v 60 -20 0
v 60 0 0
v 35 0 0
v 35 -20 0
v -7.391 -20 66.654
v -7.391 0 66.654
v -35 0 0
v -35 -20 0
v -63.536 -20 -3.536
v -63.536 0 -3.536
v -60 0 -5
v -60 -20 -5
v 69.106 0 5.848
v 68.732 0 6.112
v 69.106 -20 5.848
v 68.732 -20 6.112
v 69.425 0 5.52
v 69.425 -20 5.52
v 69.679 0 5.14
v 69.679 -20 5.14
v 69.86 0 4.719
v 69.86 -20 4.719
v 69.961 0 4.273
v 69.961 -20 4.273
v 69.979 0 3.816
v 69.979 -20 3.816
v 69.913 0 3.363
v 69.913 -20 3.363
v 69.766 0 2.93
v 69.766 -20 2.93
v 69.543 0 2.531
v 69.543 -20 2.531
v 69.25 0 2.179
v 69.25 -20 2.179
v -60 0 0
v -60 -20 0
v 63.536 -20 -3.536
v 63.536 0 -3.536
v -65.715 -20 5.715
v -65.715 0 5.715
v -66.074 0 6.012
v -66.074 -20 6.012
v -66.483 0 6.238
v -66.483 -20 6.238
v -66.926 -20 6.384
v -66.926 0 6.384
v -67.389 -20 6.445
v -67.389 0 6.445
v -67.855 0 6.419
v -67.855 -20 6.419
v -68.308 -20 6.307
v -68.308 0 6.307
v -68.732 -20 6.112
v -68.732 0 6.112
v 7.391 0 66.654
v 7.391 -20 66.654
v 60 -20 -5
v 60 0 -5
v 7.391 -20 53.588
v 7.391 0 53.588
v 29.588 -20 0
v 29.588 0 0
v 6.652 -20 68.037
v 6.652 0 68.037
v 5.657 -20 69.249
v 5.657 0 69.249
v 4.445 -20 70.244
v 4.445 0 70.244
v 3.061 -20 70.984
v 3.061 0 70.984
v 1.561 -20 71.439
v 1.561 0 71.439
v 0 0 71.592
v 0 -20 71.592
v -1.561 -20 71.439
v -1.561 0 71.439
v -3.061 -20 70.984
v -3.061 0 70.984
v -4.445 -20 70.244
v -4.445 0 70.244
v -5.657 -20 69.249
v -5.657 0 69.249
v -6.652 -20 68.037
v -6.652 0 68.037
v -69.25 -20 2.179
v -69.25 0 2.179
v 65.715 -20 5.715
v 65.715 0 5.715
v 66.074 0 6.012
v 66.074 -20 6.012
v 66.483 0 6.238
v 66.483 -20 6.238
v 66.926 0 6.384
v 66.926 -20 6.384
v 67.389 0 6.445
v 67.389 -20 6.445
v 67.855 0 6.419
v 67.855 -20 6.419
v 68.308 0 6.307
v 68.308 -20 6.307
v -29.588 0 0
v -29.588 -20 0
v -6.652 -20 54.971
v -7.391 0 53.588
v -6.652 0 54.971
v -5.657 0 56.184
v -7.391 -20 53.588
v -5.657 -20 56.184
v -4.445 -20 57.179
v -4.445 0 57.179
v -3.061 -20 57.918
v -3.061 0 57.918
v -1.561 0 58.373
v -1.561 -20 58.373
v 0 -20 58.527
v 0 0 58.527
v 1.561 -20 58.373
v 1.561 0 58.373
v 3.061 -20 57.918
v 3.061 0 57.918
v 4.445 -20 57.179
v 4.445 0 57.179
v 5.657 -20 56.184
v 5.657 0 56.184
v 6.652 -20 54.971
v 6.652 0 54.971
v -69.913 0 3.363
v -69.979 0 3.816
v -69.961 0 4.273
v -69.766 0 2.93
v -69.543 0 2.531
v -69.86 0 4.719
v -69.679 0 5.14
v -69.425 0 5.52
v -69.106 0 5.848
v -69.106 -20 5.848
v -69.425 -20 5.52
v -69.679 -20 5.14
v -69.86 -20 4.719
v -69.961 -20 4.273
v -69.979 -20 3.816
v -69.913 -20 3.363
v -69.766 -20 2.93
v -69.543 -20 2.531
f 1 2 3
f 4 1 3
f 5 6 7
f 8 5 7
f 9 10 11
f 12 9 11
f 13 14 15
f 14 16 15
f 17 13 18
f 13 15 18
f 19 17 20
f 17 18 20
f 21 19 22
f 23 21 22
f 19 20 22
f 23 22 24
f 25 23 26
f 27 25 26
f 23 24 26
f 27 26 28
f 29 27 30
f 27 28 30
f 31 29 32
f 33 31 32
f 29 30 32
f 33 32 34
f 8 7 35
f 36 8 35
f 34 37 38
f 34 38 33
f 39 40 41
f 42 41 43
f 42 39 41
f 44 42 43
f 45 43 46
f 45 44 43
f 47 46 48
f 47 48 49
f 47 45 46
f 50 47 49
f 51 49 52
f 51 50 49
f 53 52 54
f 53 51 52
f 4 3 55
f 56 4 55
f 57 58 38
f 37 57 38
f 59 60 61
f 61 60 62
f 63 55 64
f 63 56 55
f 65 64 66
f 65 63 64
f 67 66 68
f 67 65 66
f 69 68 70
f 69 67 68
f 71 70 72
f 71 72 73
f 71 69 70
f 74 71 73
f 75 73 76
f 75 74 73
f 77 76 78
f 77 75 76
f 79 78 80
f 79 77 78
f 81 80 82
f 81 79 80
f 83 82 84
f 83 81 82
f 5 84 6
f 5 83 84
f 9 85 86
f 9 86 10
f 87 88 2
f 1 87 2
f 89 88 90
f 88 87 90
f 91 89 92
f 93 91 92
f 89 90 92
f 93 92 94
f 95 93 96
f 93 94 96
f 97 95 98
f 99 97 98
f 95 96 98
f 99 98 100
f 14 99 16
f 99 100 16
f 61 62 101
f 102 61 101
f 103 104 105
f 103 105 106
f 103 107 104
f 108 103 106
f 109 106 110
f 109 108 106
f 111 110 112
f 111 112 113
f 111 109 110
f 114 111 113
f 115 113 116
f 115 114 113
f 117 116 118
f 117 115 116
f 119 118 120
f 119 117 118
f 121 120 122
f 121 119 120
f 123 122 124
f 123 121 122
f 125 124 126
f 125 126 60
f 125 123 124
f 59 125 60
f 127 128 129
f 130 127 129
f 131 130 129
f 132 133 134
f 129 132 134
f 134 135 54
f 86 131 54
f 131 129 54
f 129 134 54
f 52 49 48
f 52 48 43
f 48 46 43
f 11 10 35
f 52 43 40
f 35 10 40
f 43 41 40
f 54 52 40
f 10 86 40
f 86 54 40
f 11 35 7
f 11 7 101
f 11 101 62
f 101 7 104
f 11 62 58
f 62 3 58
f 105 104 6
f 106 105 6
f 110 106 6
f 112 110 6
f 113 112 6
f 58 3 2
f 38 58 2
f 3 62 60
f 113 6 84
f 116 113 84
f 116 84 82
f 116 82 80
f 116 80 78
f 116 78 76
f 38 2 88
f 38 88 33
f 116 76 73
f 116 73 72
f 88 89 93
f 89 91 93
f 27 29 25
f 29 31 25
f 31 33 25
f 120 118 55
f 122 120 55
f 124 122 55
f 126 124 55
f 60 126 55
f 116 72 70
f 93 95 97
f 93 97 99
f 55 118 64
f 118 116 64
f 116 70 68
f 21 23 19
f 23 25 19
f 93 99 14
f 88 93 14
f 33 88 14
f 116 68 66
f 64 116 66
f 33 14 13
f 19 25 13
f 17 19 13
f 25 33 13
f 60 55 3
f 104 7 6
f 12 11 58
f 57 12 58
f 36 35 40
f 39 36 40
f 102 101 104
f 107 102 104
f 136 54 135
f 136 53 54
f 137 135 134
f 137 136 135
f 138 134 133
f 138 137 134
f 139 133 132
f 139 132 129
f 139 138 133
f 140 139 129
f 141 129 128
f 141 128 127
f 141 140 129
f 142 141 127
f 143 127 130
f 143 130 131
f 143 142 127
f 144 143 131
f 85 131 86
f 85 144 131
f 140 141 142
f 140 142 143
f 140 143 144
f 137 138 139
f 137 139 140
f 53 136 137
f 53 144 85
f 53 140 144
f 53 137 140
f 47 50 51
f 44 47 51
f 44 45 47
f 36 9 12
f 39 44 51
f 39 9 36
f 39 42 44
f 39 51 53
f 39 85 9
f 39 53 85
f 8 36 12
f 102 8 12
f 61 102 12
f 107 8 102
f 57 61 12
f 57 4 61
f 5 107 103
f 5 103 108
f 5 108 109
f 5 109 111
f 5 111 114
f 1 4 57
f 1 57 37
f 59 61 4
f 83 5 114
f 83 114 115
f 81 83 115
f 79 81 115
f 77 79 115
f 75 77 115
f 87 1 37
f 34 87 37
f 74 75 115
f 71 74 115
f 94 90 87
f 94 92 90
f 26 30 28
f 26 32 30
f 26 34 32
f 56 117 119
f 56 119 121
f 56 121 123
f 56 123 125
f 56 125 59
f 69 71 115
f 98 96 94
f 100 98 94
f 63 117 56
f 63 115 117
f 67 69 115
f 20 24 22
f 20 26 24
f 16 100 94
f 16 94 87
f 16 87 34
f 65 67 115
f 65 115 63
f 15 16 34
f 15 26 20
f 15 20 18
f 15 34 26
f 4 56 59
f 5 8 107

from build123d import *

# Parameters (mm, degrees)
F1_DEPTH = 20
F2_R     = 8
F3_R     = 2.49999


# Not quite as in the source:
# - a fillet or chamfer is up to 0.001 mm smaller than in the source, because OpenCascade refuses the exact size


with BuildPart() as f1:
    # F0 (on Front) → F1 (new body)
    with BuildSketch(Plane.XZ):
        Polygon((-35, 0), (-29.5880389985, 0), (0, 71.4318450343), (0, 84.4974746831), align=None)
        Polygon((0, 71.4318450343), (29.5880389985, 0), (35, 0), (0, 84.4974746831), align=None)
        Polygon((0, -5), (0, 0), (-29.5880389985, 0), (-35, 0), (-60, 0), (-67.0710678119, 7.0710678119), (-71.5539451727, 4.4828773608), (-63.5355339059, -3.5355339059), (-60, -5), align=None)
        Polygon((29.5880389985, 0), (0, 0), (0, -5), (60, -5), (63.5355339059, -3.5355339059), (71.5539451727, 4.4828773608), (67.0710678119, 7.0710678119), (60, 0), (35, 0), align=None)
    extrude(amount=F1_DEPTH)

    # F2
    f2_edges = [f1.edges().sort_by_distance(p)[0] for p in [
        (0, -10, 84.497475),
        (0, -10, 71.431845),
    ]]
    fillet(f2_edges, radius=F2_R)

    # F3 (radius 2.5 in the source; OpenCascade refuses exactly that, so slightly less here)
    f3_edges = [f1.edges().sort_by_distance(p)[0] for p in [
        (-67.071068, -10, 7.071068),
        (-71.553945, -10, 4.482877),
        (67.071068, -10, 7.071068),
        (71.553945, -10, 4.482877),
    ]]
    fillet(f3_edges, radius=F3_R)


solid = f1.part
